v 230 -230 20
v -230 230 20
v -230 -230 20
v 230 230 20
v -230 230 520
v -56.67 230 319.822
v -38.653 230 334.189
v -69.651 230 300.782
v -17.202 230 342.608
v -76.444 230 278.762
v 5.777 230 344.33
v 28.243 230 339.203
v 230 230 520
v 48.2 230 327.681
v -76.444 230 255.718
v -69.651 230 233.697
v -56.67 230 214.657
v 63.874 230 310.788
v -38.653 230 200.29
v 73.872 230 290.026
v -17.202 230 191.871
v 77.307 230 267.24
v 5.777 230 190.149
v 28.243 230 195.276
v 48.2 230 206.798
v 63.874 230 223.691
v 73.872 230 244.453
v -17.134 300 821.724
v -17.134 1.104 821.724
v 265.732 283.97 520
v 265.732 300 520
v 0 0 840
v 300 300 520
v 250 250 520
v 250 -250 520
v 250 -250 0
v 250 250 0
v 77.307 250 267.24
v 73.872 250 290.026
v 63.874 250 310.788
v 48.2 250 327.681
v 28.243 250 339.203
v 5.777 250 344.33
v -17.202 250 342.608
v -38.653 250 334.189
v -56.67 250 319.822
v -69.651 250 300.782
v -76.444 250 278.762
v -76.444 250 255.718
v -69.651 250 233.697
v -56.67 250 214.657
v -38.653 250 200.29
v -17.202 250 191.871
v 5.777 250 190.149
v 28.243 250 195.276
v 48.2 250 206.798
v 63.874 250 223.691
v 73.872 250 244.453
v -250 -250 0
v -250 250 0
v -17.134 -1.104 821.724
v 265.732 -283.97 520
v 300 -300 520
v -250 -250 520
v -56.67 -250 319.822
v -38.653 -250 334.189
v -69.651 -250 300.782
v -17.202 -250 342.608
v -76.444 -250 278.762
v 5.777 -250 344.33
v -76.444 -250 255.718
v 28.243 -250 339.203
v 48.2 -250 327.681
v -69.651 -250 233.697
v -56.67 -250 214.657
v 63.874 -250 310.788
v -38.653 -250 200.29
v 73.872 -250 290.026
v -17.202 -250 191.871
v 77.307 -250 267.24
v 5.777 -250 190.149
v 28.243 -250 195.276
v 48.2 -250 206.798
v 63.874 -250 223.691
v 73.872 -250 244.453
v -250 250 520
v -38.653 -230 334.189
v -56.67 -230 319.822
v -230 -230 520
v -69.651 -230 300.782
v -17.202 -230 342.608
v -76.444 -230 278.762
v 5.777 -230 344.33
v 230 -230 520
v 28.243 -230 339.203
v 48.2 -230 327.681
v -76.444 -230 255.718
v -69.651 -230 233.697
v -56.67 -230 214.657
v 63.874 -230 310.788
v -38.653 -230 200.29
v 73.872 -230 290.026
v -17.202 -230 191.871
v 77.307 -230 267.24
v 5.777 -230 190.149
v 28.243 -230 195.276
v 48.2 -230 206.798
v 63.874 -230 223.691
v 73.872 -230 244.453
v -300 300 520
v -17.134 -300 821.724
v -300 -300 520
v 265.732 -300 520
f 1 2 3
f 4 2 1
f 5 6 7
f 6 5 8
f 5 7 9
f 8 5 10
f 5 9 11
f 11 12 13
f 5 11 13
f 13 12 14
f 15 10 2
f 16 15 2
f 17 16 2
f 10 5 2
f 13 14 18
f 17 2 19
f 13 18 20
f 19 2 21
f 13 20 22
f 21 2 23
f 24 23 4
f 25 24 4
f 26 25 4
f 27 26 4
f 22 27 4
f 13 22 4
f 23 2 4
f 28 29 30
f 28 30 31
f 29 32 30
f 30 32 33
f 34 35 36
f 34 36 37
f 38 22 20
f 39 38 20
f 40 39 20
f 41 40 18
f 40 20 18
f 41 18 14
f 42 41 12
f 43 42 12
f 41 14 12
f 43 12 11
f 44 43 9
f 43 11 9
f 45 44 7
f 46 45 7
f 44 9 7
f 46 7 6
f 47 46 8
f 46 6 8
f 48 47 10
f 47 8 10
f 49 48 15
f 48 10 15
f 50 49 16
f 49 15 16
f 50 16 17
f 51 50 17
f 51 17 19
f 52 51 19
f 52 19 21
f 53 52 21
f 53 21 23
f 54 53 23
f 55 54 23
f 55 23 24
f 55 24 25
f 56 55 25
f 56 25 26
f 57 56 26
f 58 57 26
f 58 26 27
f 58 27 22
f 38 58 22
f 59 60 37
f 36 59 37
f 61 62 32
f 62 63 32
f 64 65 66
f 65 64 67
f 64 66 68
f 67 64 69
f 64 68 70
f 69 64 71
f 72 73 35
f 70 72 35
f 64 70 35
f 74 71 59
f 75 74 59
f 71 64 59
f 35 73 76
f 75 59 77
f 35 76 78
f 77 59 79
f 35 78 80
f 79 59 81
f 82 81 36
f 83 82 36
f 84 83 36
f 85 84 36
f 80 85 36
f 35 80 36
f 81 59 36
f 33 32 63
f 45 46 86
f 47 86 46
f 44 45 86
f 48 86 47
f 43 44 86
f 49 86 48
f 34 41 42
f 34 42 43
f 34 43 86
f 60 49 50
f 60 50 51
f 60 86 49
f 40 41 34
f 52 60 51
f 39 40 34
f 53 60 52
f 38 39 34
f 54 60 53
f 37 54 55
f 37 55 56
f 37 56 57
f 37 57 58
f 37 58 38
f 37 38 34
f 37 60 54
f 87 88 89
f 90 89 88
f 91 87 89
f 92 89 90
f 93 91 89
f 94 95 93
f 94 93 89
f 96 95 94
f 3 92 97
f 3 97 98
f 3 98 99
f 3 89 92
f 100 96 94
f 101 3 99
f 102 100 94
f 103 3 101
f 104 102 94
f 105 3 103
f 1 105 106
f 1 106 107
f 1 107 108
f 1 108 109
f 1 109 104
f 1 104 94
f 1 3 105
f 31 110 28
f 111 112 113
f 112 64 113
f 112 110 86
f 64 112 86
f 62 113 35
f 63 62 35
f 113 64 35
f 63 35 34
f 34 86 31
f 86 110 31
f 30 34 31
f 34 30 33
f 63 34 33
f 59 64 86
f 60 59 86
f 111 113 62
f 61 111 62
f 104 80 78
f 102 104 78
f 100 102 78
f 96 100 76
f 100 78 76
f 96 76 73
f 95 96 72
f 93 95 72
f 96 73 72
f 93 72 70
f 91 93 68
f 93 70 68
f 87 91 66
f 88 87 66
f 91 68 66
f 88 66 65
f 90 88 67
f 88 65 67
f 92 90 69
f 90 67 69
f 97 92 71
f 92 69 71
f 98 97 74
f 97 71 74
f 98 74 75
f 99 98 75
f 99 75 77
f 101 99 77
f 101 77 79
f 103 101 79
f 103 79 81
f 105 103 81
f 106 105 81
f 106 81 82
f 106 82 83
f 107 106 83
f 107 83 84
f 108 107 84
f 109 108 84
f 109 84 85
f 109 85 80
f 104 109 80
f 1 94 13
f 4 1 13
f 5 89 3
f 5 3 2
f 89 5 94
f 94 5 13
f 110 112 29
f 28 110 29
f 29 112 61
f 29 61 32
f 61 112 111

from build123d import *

# Parameters (mm, degrees)
F0_W      = 500
F0_H      = 500
F1_DEPTH  = 20
F2_W      = 500
F2_H      = 500
F2_W_2    = 460
F2_H_2    = 460
F3_DEPTH  = 500
F4_R      = 77.3069770254
F5_DEPTH  = 500.001
F6_W      = 600
F6_H      = 600
F7_DEPTH  = 20
F8_DEPTH  = 300
F10_DEPTH = 600.001
F12_DEPTH = 25


with BuildPart() as f1:
    # F0 (on Top) → F1 (new body)
    with BuildSketch(Plane.XY):
        Rectangle(F0_W, F0_H)
    extrude(amount=F1_DEPTH)

    # F2 (on face) → F3 (join)
    with BuildSketch(Plane.XY.offset(20)):
        Rectangle(F2_W, F2_H)
        Rectangle(F2_W_2, F2_H_2, mode=Mode.SUBTRACT)
    extrude(amount=F3_DEPTH)

    # F4 (on face) → F5 (cut, through all)
    with BuildSketch(Plane.XZ.offset(250)):
        with Locations((0, 267.239511013)):
            Circle(F4_R)
    extrude(amount=-F5_DEPTH, mode=Mode.SUBTRACT)

    # F6 (on face) → F7 (join)
    with BuildSketch(Plane.XY.offset(520)):
        Rectangle(F6_W, F6_H)
    extrude(amount=F7_DEPTH)

    # F8 (add): a face of the model
    f8_faces = [f1.faces().sort_by_distance(p)[0] for p in [
        (0, 0, 540),
    ]]
    extrude(f8_faces, amount=F8_DEPTH)

    # F9 (on face) → F10 (cut, through all)
    with BuildSketch(Plane.XZ.offset(300)):
        Polygon((-300, 520), (0, 840), (-300, 840), align=None)
        Polygon((300, 840), (0, 840), (300, 520), align=None)
    extrude(amount=-F10_DEPTH, mode=Mode.SUBTRACT)

    # F11 (on face) → F12 (cut)
    with BuildSketch(Plane(origin=(419.1268191268, 0, 392.9313929314), x_dir=(0, 1, 0), z_dir=(0.7295372041, 0, 0.6839411289))):
        Polygon((-300, 174.1770074884), (0, 612.8112514777), (-300, 612.8112514777), align=None)
        Polygon((300, 612.8112514777), (0, 612.8112514777), (300, 174.1770074884), align=None)
    extrude(amount=-F12_DEPTH, mode=Mode.SUBTRACT)


solid = f1.part
